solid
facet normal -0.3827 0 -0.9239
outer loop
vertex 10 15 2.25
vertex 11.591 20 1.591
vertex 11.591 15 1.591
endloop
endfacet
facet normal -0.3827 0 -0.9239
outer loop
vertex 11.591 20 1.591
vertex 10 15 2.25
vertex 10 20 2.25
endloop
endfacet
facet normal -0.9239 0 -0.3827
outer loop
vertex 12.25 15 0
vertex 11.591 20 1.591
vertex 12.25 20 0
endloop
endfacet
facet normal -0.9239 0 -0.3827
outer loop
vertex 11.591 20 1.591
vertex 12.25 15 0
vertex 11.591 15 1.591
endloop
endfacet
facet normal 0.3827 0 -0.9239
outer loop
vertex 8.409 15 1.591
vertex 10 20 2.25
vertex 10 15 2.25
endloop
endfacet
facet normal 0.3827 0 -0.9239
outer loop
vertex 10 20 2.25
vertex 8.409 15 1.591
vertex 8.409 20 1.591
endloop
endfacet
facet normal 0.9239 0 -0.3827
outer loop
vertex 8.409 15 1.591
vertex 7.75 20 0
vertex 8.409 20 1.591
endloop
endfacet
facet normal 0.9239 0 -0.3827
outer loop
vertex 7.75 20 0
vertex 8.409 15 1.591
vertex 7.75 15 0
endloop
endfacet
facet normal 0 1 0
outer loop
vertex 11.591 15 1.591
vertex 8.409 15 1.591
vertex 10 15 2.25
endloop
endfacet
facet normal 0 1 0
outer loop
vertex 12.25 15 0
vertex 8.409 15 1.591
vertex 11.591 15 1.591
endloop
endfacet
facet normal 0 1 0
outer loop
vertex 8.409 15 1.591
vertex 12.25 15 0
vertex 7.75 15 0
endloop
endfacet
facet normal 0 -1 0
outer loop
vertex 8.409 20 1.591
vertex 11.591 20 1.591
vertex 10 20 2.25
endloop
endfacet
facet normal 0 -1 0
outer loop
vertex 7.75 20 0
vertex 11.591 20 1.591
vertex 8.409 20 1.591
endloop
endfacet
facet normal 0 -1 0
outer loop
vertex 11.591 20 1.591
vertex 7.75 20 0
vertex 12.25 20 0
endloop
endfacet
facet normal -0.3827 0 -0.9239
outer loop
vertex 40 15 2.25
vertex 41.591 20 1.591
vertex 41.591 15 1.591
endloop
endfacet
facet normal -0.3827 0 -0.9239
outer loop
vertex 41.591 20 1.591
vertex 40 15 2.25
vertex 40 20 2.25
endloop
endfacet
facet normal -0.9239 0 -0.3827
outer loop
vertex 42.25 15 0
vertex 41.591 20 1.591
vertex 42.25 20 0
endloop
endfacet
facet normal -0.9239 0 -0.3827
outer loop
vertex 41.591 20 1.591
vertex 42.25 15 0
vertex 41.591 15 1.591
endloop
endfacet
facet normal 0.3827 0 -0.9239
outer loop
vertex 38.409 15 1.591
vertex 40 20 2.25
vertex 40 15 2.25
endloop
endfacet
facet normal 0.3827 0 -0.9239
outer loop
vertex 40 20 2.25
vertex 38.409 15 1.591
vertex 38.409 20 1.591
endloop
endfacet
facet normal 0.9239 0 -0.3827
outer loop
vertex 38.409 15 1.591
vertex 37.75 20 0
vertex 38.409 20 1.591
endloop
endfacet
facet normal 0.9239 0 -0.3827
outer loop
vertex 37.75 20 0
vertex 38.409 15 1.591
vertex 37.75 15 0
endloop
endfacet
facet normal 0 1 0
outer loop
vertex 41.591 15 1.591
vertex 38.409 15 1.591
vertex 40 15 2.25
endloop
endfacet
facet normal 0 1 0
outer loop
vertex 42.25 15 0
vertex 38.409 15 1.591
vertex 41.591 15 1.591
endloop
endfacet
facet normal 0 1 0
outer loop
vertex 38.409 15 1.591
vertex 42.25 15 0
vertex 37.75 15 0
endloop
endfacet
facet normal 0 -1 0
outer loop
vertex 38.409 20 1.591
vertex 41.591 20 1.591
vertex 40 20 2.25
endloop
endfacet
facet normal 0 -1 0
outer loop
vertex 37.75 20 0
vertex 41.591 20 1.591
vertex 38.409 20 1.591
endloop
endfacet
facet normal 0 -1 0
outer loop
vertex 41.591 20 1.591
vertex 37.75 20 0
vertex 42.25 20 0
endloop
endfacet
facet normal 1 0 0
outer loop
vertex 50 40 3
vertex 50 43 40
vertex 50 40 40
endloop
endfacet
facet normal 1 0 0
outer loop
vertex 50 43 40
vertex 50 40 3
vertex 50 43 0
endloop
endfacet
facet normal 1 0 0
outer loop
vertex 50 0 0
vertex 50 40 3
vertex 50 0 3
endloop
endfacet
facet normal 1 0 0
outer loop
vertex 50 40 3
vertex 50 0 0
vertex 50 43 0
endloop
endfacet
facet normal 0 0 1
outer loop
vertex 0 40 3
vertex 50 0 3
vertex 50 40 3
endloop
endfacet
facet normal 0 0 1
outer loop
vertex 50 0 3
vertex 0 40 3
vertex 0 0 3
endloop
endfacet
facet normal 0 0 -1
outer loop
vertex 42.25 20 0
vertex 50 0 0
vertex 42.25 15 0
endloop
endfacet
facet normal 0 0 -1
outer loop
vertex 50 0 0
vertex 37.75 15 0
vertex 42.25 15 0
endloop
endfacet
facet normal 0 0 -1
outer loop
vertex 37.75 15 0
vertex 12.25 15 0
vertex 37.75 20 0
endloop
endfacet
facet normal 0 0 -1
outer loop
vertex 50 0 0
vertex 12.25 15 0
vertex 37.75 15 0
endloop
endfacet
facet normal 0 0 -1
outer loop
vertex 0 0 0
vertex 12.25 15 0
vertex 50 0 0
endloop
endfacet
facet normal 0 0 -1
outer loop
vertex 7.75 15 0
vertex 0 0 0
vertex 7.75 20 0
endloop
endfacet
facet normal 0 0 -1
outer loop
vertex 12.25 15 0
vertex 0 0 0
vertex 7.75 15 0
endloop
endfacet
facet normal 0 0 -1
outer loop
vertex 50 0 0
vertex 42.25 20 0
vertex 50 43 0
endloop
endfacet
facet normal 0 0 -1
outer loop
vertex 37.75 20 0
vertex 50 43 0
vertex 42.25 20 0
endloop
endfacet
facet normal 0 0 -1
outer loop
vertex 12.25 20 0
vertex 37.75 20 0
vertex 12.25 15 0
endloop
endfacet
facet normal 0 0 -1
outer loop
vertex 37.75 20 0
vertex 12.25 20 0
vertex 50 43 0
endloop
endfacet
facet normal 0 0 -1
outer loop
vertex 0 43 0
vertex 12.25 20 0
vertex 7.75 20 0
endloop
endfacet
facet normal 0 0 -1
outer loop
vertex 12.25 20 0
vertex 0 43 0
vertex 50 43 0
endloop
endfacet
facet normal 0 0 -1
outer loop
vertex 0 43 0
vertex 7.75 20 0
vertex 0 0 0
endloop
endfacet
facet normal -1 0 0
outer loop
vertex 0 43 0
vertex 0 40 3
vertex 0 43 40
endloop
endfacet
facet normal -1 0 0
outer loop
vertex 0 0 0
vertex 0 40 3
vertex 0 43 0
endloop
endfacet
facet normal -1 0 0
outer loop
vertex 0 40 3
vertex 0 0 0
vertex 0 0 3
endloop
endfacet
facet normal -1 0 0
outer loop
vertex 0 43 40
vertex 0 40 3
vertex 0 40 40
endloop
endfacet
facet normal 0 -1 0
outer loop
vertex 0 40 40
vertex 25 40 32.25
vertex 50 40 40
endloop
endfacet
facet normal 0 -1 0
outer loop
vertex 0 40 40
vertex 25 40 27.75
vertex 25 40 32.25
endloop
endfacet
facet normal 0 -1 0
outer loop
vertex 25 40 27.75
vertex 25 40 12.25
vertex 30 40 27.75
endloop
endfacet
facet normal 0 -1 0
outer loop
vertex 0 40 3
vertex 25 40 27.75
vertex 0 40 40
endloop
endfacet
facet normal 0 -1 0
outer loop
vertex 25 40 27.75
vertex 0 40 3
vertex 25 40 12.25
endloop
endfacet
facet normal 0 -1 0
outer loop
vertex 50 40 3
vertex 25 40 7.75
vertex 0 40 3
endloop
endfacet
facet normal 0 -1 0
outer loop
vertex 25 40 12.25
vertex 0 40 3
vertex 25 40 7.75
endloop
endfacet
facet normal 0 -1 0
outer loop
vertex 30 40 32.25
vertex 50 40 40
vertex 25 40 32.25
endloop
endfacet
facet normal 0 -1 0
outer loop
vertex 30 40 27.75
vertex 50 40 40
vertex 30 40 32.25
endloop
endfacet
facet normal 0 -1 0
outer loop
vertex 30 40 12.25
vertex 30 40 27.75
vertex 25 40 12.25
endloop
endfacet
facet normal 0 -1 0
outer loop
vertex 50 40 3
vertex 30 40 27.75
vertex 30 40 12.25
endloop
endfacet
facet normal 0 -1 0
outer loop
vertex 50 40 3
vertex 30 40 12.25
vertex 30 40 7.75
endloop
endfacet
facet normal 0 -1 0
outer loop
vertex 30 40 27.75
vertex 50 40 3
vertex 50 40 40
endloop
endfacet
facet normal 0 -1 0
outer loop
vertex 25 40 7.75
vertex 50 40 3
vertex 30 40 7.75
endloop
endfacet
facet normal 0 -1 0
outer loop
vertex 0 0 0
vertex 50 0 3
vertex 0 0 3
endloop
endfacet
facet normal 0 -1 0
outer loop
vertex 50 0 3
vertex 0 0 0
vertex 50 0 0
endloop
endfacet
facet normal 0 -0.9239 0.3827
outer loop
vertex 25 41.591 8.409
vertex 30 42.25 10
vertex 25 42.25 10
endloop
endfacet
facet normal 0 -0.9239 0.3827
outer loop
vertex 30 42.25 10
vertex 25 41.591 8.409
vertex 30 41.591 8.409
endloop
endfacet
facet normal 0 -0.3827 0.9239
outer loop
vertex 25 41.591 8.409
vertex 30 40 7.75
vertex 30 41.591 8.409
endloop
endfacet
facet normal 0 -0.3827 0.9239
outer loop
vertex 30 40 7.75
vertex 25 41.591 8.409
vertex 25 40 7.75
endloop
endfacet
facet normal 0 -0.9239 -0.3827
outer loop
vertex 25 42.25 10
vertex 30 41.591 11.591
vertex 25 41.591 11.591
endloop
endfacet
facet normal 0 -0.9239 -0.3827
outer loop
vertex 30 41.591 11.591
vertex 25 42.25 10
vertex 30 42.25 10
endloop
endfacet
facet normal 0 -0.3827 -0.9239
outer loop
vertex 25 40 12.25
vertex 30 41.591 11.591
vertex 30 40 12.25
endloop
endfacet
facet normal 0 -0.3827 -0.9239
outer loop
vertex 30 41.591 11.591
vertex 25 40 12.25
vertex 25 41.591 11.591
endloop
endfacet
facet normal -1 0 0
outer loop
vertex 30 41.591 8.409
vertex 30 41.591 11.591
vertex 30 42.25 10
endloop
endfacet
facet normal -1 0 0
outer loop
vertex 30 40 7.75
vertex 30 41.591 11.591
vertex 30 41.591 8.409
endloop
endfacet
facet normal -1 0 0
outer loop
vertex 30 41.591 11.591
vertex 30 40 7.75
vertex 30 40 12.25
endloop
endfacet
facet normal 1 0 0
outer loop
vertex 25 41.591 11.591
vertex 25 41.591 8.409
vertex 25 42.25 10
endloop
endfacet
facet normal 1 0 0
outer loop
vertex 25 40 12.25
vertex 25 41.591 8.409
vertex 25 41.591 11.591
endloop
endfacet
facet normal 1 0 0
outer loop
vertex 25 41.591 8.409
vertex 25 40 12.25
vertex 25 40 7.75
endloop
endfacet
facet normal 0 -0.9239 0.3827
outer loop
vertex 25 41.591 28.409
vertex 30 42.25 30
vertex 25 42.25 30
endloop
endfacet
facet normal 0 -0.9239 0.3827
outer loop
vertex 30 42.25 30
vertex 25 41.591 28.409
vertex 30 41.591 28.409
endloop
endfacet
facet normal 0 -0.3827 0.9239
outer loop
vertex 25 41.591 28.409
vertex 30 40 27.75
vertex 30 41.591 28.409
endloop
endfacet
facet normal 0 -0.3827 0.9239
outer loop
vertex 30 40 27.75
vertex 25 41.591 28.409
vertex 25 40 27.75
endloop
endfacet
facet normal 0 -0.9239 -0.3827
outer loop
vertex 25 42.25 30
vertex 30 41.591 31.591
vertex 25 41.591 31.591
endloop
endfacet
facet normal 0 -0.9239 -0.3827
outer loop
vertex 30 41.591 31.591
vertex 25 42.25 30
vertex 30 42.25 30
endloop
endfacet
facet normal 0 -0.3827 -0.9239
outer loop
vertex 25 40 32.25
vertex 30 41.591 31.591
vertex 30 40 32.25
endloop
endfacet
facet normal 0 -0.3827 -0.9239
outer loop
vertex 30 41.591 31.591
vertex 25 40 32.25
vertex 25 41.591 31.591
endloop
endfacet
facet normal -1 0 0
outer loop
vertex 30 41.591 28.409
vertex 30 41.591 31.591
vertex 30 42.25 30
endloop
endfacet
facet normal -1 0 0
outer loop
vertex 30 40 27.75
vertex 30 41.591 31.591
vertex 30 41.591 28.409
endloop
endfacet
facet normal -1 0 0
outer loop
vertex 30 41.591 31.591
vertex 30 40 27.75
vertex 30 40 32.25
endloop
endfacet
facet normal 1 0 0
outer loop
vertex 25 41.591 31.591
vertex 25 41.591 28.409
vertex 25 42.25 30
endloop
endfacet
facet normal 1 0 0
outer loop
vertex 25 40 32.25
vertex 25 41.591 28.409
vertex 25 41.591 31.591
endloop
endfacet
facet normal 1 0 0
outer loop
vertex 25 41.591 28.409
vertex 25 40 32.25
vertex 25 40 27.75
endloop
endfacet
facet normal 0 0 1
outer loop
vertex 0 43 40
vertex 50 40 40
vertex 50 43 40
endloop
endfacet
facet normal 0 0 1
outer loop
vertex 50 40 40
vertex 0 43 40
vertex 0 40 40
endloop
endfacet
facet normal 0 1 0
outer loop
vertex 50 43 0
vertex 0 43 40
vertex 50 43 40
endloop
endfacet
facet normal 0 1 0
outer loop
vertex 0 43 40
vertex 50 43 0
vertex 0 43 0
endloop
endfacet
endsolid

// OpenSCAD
// L-bracket parameters
width = 50;
depth = 40;
height = 40;
thickness = 3;
screw_diameter = 4.5;
countersink_diameter = 8;
countersink_depth = 2;
hole_offset = 10;

// Module for creating a countersunk hole
module countersunk_hole(diameter, depth) {
  difference() {
    cylinder(h=thickness + depth, r=diameter/2);
    translate([0, 0, -depth]) cylinder(h=depth, r=(countersink_diameter)/2);
  }
}

// Horizontal flange
module horizontal_flange() {
  difference() {
    cube([width, depth, thickness]);
    // Countersunk holes on the top face
    translate([hole_offset, depth/2, 0]) rotate([90,0,0]) countersunk_hole(screw_diameter, countersink_depth);
    translate([width - hole_offset, depth/2, 0]) rotate([90,0,0]) countersunk_hole(screw_diameter, countersink_depth);
  }
}

// Vertical flange
module vertical_flange() {
  difference() {
    cube([width, thickness, height]);
    // Countersunk holes on the front face
    translate([width/2, 0, hole_offset]) rotate([0,90,0]) countersunk_hole(screw_diameter, countersink_depth);
    translate([width/2, 0, height - hole_offset]) rotate([0,90,0]) countersunk_hole(screw_diameter, countersink_depth);
  }
}

// L-bracket assembly
union() {
  horizontal_flange();
  translate([0, depth, 0]) vertical_flange();
}
